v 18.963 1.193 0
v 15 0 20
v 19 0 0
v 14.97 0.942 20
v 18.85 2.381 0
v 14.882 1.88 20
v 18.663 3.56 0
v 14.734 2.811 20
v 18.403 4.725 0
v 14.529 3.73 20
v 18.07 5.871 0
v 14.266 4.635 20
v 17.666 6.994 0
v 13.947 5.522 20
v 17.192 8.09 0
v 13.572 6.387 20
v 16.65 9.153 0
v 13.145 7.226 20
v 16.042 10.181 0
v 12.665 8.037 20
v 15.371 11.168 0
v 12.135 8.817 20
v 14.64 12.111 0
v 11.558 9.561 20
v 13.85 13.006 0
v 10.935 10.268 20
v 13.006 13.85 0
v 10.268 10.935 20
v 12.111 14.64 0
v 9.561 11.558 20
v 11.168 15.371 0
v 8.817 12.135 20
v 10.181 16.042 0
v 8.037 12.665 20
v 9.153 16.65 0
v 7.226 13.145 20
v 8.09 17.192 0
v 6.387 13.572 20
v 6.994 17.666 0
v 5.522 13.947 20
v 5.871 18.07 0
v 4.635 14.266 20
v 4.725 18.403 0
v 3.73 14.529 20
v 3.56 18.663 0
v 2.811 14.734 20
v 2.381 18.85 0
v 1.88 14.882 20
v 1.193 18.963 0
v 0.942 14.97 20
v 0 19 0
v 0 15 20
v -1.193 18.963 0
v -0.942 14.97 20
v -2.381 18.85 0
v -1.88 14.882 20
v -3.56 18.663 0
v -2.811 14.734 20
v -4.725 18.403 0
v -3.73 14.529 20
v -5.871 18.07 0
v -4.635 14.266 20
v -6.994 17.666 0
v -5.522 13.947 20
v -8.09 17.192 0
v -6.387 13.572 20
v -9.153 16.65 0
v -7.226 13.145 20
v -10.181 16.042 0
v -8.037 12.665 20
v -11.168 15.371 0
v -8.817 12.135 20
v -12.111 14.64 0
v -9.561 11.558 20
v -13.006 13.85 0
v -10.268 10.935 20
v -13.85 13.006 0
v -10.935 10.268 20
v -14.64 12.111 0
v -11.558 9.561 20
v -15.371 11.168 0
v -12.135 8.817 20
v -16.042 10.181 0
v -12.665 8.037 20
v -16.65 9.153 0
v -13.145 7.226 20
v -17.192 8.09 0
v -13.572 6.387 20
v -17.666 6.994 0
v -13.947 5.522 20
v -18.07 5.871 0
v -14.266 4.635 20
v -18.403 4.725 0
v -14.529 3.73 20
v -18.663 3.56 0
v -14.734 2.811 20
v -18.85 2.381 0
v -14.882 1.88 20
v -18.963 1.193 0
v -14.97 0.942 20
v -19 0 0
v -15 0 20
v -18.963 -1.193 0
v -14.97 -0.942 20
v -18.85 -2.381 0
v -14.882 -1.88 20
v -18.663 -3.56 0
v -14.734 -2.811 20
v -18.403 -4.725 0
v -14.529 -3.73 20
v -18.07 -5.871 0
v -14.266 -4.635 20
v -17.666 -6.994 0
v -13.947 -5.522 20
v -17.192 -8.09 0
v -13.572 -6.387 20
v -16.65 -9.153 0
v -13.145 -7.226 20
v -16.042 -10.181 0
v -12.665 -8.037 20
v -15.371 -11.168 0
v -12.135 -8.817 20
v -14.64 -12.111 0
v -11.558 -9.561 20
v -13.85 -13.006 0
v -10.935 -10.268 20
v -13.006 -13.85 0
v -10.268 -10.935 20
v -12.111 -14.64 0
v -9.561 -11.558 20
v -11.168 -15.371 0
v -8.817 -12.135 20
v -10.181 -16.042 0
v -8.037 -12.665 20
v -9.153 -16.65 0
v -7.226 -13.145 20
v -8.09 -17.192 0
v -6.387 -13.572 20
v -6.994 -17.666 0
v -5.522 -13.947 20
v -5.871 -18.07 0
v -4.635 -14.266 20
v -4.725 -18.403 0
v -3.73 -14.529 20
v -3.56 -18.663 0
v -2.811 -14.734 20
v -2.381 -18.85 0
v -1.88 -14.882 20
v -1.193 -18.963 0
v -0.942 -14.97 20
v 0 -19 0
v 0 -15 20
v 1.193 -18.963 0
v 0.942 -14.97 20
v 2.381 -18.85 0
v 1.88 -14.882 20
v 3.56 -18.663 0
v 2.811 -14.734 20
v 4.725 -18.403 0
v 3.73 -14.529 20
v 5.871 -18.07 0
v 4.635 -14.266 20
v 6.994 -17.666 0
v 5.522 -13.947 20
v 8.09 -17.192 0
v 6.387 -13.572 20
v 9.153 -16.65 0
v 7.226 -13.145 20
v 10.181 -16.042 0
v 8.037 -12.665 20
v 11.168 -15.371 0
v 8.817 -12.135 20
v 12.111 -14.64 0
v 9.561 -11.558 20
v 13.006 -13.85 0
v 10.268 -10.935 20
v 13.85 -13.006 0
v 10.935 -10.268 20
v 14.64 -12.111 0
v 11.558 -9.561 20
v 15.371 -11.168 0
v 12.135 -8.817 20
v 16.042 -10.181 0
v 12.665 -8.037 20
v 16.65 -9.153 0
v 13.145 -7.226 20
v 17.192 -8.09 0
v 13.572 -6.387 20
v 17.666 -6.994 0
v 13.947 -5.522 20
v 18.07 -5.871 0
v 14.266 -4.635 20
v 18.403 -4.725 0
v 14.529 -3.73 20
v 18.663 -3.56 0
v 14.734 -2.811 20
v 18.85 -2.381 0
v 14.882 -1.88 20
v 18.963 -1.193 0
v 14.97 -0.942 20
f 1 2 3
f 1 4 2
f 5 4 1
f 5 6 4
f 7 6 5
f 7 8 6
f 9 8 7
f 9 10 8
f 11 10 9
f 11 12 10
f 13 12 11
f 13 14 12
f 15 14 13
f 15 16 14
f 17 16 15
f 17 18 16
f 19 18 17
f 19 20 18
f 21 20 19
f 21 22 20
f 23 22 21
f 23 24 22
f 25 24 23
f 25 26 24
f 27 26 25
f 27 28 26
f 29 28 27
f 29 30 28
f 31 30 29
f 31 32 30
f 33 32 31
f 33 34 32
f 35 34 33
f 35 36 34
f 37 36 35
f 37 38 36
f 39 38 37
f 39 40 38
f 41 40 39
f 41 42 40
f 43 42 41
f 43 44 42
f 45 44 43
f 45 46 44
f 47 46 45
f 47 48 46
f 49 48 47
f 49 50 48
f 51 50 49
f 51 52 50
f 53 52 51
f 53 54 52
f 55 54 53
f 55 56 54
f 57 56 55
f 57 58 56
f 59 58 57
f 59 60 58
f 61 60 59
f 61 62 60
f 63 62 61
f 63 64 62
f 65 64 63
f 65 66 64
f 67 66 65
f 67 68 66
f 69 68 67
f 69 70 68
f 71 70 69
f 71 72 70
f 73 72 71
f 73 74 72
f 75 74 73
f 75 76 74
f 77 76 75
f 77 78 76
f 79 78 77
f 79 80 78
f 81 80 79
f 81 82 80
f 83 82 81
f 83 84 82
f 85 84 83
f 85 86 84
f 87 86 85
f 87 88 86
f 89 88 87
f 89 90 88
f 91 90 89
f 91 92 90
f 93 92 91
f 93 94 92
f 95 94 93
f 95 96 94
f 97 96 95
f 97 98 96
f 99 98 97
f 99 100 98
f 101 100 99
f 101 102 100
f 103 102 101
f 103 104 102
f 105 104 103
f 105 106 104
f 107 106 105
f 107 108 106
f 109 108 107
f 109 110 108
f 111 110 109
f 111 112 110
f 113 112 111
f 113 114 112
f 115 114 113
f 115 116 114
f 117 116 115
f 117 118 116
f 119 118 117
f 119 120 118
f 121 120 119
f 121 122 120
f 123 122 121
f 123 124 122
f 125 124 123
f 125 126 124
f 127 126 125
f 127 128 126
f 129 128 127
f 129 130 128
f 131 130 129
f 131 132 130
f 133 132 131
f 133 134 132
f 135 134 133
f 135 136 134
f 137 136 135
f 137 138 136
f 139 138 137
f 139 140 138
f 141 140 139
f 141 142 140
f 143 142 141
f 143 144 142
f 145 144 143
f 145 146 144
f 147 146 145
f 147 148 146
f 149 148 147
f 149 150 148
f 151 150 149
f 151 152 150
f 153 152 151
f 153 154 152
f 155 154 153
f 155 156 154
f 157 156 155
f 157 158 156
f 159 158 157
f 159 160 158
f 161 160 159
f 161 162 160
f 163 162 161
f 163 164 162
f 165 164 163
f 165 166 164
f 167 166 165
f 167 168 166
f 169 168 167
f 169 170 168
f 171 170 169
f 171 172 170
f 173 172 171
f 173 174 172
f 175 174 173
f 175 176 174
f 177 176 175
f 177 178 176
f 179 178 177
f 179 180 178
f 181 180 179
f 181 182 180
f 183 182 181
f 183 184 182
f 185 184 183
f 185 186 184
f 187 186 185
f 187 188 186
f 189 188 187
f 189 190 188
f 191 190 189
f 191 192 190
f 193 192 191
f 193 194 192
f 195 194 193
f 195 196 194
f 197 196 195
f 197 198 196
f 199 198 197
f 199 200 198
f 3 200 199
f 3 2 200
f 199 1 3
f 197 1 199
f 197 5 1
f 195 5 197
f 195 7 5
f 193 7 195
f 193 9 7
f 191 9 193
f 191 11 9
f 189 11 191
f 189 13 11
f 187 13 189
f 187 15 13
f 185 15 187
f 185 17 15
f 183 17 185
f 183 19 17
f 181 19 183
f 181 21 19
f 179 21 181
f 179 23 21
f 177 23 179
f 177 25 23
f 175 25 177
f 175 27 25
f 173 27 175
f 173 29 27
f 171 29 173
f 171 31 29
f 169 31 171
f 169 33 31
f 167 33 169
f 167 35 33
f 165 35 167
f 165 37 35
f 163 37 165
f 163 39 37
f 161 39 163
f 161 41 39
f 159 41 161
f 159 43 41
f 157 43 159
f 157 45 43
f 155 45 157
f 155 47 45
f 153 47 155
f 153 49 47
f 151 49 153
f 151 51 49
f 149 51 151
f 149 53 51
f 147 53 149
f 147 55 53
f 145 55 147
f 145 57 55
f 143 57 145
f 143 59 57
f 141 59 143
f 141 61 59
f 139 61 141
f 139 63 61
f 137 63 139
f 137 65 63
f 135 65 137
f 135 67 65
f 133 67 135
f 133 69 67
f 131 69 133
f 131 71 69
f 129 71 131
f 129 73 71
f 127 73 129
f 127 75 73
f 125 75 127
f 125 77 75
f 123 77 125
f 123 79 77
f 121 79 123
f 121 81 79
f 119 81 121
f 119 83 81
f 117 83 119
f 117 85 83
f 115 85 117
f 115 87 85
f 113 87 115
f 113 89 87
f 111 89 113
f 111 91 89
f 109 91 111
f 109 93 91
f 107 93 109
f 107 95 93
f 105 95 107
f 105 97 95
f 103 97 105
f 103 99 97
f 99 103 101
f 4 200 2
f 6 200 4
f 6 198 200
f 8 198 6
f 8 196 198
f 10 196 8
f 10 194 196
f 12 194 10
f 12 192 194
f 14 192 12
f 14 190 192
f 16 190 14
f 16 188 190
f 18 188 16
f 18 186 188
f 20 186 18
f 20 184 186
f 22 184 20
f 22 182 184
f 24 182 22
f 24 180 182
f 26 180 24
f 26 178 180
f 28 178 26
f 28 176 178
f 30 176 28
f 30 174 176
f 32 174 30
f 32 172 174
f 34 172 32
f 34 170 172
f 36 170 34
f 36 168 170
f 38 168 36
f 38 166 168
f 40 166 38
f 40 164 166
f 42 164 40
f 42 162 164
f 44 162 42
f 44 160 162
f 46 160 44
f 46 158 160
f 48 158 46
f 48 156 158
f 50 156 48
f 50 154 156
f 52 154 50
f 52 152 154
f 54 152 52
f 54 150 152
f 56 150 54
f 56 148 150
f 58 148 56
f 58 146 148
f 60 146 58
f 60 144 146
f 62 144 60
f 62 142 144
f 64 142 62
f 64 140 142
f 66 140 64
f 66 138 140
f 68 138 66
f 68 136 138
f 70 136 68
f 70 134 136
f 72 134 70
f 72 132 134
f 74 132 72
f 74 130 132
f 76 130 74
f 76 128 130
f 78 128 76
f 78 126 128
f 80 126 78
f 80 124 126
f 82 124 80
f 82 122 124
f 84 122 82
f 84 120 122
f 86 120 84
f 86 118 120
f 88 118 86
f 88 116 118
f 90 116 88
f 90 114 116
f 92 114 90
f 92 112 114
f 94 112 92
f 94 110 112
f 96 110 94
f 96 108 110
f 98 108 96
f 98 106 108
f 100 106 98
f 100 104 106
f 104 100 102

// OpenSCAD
// knob
translate([0,0,0]){
	cylinder(20,19,15, $fn=100);
}
				
